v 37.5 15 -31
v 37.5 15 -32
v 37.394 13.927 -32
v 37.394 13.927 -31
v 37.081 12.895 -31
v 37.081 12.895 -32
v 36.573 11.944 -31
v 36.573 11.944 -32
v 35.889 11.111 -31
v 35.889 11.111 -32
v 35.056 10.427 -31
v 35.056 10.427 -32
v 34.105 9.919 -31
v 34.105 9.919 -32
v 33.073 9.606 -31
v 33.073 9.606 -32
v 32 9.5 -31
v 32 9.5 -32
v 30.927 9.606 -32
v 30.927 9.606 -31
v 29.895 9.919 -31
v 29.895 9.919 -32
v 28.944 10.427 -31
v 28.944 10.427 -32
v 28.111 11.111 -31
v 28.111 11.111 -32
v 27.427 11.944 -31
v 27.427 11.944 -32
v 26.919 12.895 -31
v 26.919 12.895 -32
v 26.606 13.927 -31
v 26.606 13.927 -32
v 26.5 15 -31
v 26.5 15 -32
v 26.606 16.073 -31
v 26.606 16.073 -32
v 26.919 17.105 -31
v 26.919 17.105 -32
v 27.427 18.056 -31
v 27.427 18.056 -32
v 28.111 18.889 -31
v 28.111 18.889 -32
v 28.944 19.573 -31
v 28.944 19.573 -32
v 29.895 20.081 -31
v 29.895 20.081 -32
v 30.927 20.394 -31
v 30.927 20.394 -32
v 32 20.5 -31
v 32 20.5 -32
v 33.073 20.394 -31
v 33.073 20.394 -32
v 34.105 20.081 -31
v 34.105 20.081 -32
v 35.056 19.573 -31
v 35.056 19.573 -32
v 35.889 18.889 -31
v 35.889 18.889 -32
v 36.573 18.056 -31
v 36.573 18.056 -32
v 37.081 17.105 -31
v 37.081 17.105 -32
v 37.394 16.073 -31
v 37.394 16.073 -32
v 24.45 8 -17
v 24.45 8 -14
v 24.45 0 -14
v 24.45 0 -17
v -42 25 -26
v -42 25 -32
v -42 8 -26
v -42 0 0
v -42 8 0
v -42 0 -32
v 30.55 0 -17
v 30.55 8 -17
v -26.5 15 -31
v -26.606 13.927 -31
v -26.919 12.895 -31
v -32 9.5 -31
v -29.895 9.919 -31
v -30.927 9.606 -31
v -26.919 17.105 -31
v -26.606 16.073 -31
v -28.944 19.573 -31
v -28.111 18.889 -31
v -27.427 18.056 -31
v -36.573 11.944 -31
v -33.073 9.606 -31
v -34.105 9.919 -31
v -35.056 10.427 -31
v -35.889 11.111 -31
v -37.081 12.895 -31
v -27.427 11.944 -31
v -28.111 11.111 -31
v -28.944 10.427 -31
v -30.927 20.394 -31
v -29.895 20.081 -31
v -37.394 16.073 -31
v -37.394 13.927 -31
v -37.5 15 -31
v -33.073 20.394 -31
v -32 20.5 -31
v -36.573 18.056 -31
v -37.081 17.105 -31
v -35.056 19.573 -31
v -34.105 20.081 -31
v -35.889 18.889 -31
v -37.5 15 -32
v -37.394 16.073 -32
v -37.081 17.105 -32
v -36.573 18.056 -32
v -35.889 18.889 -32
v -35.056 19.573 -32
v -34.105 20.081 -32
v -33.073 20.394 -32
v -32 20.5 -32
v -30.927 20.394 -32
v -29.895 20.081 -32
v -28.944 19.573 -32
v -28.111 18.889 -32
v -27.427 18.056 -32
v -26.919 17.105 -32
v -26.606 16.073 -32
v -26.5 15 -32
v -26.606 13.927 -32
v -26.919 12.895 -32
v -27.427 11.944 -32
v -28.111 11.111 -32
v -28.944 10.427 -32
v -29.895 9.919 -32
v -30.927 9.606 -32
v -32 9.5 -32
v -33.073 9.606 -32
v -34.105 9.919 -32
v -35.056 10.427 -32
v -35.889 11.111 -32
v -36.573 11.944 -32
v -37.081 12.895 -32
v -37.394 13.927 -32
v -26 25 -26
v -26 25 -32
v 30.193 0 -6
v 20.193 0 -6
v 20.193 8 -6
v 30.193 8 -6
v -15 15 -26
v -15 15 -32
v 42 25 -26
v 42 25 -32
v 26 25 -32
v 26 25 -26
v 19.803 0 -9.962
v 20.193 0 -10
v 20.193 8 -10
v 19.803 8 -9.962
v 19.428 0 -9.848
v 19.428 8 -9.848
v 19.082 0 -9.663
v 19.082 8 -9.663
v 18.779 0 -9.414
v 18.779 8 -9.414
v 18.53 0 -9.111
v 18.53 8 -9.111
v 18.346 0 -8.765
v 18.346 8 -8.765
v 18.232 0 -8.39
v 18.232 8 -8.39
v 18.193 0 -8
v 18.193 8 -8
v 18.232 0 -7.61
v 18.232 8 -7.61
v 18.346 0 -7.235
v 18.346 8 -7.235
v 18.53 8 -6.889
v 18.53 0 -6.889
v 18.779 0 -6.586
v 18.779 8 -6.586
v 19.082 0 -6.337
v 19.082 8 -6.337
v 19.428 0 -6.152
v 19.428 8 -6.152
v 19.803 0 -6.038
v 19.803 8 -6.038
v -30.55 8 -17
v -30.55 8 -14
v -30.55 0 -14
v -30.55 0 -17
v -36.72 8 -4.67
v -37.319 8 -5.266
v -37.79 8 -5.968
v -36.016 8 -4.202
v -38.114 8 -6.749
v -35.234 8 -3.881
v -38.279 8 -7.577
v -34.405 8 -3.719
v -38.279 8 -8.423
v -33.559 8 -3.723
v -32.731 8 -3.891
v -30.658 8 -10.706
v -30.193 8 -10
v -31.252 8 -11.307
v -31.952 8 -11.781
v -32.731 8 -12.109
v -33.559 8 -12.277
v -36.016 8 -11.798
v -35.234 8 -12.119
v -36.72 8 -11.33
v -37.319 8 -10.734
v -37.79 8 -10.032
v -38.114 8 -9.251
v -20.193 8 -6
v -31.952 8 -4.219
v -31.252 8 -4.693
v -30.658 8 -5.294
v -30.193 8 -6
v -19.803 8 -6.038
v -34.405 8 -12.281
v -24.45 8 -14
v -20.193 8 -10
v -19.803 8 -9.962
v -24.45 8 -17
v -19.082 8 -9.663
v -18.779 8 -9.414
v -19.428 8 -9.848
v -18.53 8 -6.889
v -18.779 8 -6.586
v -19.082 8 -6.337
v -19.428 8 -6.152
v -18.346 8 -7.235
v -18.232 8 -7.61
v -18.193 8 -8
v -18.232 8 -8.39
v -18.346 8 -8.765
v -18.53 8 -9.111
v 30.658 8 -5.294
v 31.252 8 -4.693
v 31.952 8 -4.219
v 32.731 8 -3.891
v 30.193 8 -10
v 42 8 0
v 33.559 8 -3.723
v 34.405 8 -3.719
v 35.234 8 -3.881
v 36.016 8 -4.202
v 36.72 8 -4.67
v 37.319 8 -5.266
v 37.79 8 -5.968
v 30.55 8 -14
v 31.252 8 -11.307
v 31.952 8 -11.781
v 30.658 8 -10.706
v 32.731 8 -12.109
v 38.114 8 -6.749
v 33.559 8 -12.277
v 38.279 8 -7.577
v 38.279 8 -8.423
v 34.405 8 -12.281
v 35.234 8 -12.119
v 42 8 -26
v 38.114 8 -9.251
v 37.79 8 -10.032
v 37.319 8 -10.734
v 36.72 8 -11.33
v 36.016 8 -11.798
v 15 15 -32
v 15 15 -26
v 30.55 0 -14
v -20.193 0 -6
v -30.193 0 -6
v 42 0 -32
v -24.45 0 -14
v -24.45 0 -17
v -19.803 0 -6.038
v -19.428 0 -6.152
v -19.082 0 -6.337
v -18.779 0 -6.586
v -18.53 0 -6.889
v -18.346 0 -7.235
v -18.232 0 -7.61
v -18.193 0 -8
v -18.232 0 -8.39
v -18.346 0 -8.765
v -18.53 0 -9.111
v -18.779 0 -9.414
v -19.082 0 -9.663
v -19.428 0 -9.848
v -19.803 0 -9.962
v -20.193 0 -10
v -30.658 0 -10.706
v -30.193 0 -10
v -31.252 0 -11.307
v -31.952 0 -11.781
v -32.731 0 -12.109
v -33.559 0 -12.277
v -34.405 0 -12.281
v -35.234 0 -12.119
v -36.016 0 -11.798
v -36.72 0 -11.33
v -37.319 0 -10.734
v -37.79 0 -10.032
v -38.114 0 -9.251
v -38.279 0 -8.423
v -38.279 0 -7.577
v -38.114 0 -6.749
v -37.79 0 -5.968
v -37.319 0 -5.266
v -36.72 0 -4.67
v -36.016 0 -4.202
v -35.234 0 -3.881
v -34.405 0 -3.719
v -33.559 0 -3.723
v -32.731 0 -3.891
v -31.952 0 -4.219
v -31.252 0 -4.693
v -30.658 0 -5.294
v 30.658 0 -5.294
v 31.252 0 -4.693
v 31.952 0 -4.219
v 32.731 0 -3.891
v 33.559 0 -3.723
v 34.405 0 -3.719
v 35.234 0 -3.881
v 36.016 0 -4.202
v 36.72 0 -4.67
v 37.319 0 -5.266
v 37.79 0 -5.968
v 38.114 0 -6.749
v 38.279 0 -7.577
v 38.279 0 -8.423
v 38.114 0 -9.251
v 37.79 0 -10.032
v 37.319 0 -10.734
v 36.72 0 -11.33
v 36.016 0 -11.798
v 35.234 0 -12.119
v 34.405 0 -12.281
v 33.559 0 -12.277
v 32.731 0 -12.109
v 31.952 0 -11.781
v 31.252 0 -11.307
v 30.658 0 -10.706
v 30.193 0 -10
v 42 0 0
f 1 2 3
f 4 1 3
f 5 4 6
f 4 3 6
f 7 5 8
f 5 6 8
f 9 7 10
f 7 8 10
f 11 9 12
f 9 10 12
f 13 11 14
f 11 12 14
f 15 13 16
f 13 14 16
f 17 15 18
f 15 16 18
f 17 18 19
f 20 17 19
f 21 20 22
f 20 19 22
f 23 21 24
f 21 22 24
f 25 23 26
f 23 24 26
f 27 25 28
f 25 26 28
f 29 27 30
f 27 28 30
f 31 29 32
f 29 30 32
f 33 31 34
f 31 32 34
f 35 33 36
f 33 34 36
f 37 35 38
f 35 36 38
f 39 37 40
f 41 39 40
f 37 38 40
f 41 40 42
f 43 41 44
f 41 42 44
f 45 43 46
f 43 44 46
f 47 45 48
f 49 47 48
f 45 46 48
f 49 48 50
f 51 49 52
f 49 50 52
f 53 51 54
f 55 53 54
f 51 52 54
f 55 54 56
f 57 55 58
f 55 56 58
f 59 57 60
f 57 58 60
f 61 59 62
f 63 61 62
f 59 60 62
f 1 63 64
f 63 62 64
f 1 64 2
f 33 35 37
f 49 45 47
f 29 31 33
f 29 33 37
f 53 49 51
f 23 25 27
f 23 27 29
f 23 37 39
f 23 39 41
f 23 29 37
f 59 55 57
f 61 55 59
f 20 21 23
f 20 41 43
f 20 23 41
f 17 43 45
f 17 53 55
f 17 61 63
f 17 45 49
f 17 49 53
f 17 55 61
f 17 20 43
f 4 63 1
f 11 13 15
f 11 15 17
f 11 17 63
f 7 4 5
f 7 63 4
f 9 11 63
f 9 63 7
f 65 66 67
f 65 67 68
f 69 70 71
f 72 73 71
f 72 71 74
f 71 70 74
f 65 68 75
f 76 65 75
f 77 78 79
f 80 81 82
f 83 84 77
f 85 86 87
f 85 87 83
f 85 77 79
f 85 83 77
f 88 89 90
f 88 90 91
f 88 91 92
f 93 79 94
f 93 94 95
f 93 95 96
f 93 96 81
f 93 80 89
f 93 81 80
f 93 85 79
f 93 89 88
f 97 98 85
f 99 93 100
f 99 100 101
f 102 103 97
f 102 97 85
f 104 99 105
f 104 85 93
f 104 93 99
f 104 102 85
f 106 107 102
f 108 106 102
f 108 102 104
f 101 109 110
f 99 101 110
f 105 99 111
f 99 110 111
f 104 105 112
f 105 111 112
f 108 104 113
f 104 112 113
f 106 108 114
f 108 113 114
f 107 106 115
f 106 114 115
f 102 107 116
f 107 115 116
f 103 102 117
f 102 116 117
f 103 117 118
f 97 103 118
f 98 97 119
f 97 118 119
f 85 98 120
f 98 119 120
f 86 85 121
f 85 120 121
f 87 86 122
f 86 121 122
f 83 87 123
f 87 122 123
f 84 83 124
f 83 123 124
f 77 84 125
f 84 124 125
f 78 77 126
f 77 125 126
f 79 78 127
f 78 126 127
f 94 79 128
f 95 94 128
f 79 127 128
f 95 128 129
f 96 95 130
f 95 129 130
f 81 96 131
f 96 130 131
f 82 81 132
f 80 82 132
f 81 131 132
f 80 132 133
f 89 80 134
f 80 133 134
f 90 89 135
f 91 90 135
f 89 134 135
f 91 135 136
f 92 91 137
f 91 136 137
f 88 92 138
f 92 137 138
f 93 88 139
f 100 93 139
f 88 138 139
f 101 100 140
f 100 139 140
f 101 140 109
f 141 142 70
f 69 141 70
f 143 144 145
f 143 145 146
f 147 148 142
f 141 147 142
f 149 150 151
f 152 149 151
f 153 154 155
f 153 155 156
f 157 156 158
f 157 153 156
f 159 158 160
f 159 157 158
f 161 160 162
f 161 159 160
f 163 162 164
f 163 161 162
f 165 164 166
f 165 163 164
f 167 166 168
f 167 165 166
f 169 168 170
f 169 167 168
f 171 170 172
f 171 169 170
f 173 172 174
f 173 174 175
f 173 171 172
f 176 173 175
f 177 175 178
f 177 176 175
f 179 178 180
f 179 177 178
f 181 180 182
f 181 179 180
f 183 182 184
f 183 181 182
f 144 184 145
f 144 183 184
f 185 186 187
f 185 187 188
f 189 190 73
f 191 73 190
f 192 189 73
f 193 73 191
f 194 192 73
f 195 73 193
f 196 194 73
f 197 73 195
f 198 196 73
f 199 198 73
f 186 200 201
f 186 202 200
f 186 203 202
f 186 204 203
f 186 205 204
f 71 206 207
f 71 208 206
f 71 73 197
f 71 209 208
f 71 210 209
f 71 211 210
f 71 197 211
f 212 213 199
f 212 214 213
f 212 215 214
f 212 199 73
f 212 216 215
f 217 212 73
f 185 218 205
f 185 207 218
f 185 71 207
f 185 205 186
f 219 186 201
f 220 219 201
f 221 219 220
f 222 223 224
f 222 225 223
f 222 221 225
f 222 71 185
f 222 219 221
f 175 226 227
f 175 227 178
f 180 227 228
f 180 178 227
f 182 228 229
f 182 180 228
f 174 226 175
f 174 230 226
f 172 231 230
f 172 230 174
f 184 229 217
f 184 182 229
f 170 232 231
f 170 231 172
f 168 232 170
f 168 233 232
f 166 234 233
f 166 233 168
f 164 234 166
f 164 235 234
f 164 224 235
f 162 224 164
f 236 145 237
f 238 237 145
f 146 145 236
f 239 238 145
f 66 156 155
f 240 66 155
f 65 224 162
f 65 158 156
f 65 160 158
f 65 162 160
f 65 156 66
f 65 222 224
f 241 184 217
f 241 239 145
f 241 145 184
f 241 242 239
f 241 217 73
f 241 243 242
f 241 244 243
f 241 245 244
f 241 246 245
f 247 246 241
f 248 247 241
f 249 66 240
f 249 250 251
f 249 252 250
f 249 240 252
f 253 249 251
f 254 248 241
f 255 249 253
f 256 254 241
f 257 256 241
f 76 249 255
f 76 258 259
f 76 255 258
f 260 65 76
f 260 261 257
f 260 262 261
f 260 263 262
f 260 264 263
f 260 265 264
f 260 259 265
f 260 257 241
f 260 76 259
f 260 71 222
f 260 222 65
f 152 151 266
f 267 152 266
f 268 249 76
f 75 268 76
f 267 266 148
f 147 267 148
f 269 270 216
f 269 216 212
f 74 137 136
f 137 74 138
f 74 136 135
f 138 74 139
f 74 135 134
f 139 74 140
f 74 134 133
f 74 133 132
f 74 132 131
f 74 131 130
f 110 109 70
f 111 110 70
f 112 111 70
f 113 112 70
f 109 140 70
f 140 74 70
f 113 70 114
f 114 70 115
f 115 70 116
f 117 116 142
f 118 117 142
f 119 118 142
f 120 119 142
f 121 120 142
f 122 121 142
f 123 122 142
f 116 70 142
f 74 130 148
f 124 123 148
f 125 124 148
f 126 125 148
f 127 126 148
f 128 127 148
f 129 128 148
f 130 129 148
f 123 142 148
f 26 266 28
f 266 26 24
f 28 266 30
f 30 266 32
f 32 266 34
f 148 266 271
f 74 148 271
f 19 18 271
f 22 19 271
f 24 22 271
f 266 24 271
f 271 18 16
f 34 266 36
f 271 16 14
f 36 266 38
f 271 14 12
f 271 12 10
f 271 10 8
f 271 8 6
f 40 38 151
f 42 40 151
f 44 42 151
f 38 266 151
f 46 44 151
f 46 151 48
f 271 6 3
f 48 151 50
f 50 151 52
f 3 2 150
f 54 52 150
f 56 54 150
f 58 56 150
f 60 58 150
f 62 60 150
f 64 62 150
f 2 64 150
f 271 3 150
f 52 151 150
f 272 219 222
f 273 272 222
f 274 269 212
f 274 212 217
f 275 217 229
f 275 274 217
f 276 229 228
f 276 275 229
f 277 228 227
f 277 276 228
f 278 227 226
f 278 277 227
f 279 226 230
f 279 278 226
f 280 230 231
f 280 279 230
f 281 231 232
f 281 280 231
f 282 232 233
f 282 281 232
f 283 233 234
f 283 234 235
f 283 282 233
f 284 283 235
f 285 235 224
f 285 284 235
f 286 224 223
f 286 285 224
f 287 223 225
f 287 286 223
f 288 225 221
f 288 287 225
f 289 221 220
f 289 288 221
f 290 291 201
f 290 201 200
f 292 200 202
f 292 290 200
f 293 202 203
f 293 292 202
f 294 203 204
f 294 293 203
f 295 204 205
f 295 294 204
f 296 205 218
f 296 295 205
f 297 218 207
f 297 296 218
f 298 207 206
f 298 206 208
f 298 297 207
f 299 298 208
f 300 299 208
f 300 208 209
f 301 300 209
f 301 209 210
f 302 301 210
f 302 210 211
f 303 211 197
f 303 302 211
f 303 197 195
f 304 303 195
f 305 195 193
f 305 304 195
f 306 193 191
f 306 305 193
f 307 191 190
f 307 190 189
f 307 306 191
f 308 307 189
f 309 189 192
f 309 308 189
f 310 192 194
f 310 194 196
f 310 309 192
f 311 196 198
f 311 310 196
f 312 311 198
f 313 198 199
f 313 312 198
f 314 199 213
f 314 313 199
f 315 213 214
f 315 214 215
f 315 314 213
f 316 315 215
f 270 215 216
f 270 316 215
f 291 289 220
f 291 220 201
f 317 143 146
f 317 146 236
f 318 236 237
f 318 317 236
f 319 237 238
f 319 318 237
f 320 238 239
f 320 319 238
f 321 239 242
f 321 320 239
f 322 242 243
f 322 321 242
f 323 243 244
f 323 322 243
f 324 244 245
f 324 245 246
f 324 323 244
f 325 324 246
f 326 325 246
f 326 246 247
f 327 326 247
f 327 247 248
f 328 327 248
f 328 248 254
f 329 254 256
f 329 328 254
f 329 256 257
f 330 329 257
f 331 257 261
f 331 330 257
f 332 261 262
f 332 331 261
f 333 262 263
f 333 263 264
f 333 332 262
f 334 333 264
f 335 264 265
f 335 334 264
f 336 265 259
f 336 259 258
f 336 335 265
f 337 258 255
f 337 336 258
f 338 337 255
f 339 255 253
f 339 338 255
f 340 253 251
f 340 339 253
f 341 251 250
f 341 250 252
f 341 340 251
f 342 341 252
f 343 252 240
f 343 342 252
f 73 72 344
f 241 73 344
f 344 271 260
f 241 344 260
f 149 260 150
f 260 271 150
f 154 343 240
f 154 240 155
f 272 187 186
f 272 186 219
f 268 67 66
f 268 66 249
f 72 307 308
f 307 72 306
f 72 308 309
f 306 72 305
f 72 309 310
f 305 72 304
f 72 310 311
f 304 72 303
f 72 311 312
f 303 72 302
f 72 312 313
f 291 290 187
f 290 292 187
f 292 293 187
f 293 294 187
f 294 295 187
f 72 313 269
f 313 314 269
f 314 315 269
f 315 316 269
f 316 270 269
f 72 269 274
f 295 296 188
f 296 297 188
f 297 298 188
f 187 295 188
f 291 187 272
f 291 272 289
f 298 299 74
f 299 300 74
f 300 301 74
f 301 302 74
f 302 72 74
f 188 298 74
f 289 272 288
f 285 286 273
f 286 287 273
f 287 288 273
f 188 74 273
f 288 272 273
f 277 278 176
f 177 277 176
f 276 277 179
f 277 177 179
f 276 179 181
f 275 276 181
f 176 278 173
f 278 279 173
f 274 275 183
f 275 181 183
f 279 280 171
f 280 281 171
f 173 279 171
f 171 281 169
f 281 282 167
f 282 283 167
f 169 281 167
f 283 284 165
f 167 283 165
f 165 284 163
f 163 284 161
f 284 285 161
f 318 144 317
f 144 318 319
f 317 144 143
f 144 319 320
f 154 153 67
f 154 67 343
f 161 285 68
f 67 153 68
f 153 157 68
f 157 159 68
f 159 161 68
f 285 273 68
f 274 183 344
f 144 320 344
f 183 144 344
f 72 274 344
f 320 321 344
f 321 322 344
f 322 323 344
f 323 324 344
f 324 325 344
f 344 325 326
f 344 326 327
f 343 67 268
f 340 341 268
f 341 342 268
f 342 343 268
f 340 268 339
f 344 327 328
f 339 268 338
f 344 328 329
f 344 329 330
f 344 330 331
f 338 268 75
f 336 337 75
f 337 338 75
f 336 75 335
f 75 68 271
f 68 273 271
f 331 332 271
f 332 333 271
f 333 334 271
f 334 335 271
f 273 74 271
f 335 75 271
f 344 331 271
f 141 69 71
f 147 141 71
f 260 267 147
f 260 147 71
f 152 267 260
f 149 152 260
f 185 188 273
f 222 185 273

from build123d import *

# Parameters (mm, degrees)
SKETCH2_W           = 84
SKETCH2_H           = 32
SKETCH2_W_2         = 6.1
SKETCH2_H_2         = 3
BOSS_EXTRUDE2_DEPTH = 8
BOSS_EXTRUDE3_DEPTH = 6
SKETCH4_R           = 5.5
CUT_EXTRUDE1_DEPTH  = 1


with BuildPart() as part:
    # Sketch2 → Boss-Extrude2 (new body)
    with BuildSketch(Plane(origin=(0, 0, 0), x_dir=(1, 0, 0), z_dir=(0, 1, 0))):
        with Locations((0, 16)):
            Rectangle(SKETCH2_W, SKETCH2_H)
        with BuildLine():
            ThreePointArc((20.193426738, 10), (18.193426738, 8), (20.193426738, 6))
            Line((20.193426738, 6), (30.193426738, 6))
            ThreePointArc((30.193426738, 6), (38.3, 8), (30.193426738, 10))
            Line((30.193426738, 10), (20.193426738, 10))
        make_face(mode=Mode.SUBTRACT)
        with BuildLine():
            ThreePointArc((-30.193426738, 10), (-38.3, 8), (-30.193426738, 6))
            Line((-30.193426738, 6), (-20.193426738, 6))
            ThreePointArc((-20.193426738, 6), (-18.193426738, 8), (-20.193426738, 10))
            Line((-20.193426738, 10), (-30.193426738, 10))
        make_face(mode=Mode.SUBTRACT)
        with Locations((27.5, 15.5)):
            Rectangle(SKETCH2_W_2, SKETCH2_H_2, mode=Mode.SUBTRACT)
        with Locations((-27.5, 15.5)):
            Rectangle(SKETCH2_W_2, SKETCH2_H_2, mode=Mode.SUBTRACT)
    extrude(amount=BOSS_EXTRUDE2_DEPTH)

    # Sketch3 → Boss-Extrude3 (add)
    with BuildSketch(Plane(origin=(0, 0, -32), x_dir=(-1, 0, 0), z_dir=(0, 0, -1))):
        Polygon((-42, 8), (-42, 25), (-26, 25), (-15, 15), (15, 15), (26, 25), (42, 25), (42, 8), align=None)
    extrude(amount=-BOSS_EXTRUDE3_DEPTH)

    # Sketch4 → Cut-Extrude1 (cut)
    with BuildSketch(Plane(origin=(0, 0, -32), x_dir=(-1, 0, 0), z_dir=(0, 0, -1))):
        with Locations((32, 15)):
            Circle(SKETCH4_R)
        with Locations(Location((-32, 15, 0), (0, 0, 180))):
            Circle(SKETCH4_R)
    extrude(amount=-CUT_EXTRUDE1_DEPTH, mode=Mode.SUBTRACT)


solid = part.part
